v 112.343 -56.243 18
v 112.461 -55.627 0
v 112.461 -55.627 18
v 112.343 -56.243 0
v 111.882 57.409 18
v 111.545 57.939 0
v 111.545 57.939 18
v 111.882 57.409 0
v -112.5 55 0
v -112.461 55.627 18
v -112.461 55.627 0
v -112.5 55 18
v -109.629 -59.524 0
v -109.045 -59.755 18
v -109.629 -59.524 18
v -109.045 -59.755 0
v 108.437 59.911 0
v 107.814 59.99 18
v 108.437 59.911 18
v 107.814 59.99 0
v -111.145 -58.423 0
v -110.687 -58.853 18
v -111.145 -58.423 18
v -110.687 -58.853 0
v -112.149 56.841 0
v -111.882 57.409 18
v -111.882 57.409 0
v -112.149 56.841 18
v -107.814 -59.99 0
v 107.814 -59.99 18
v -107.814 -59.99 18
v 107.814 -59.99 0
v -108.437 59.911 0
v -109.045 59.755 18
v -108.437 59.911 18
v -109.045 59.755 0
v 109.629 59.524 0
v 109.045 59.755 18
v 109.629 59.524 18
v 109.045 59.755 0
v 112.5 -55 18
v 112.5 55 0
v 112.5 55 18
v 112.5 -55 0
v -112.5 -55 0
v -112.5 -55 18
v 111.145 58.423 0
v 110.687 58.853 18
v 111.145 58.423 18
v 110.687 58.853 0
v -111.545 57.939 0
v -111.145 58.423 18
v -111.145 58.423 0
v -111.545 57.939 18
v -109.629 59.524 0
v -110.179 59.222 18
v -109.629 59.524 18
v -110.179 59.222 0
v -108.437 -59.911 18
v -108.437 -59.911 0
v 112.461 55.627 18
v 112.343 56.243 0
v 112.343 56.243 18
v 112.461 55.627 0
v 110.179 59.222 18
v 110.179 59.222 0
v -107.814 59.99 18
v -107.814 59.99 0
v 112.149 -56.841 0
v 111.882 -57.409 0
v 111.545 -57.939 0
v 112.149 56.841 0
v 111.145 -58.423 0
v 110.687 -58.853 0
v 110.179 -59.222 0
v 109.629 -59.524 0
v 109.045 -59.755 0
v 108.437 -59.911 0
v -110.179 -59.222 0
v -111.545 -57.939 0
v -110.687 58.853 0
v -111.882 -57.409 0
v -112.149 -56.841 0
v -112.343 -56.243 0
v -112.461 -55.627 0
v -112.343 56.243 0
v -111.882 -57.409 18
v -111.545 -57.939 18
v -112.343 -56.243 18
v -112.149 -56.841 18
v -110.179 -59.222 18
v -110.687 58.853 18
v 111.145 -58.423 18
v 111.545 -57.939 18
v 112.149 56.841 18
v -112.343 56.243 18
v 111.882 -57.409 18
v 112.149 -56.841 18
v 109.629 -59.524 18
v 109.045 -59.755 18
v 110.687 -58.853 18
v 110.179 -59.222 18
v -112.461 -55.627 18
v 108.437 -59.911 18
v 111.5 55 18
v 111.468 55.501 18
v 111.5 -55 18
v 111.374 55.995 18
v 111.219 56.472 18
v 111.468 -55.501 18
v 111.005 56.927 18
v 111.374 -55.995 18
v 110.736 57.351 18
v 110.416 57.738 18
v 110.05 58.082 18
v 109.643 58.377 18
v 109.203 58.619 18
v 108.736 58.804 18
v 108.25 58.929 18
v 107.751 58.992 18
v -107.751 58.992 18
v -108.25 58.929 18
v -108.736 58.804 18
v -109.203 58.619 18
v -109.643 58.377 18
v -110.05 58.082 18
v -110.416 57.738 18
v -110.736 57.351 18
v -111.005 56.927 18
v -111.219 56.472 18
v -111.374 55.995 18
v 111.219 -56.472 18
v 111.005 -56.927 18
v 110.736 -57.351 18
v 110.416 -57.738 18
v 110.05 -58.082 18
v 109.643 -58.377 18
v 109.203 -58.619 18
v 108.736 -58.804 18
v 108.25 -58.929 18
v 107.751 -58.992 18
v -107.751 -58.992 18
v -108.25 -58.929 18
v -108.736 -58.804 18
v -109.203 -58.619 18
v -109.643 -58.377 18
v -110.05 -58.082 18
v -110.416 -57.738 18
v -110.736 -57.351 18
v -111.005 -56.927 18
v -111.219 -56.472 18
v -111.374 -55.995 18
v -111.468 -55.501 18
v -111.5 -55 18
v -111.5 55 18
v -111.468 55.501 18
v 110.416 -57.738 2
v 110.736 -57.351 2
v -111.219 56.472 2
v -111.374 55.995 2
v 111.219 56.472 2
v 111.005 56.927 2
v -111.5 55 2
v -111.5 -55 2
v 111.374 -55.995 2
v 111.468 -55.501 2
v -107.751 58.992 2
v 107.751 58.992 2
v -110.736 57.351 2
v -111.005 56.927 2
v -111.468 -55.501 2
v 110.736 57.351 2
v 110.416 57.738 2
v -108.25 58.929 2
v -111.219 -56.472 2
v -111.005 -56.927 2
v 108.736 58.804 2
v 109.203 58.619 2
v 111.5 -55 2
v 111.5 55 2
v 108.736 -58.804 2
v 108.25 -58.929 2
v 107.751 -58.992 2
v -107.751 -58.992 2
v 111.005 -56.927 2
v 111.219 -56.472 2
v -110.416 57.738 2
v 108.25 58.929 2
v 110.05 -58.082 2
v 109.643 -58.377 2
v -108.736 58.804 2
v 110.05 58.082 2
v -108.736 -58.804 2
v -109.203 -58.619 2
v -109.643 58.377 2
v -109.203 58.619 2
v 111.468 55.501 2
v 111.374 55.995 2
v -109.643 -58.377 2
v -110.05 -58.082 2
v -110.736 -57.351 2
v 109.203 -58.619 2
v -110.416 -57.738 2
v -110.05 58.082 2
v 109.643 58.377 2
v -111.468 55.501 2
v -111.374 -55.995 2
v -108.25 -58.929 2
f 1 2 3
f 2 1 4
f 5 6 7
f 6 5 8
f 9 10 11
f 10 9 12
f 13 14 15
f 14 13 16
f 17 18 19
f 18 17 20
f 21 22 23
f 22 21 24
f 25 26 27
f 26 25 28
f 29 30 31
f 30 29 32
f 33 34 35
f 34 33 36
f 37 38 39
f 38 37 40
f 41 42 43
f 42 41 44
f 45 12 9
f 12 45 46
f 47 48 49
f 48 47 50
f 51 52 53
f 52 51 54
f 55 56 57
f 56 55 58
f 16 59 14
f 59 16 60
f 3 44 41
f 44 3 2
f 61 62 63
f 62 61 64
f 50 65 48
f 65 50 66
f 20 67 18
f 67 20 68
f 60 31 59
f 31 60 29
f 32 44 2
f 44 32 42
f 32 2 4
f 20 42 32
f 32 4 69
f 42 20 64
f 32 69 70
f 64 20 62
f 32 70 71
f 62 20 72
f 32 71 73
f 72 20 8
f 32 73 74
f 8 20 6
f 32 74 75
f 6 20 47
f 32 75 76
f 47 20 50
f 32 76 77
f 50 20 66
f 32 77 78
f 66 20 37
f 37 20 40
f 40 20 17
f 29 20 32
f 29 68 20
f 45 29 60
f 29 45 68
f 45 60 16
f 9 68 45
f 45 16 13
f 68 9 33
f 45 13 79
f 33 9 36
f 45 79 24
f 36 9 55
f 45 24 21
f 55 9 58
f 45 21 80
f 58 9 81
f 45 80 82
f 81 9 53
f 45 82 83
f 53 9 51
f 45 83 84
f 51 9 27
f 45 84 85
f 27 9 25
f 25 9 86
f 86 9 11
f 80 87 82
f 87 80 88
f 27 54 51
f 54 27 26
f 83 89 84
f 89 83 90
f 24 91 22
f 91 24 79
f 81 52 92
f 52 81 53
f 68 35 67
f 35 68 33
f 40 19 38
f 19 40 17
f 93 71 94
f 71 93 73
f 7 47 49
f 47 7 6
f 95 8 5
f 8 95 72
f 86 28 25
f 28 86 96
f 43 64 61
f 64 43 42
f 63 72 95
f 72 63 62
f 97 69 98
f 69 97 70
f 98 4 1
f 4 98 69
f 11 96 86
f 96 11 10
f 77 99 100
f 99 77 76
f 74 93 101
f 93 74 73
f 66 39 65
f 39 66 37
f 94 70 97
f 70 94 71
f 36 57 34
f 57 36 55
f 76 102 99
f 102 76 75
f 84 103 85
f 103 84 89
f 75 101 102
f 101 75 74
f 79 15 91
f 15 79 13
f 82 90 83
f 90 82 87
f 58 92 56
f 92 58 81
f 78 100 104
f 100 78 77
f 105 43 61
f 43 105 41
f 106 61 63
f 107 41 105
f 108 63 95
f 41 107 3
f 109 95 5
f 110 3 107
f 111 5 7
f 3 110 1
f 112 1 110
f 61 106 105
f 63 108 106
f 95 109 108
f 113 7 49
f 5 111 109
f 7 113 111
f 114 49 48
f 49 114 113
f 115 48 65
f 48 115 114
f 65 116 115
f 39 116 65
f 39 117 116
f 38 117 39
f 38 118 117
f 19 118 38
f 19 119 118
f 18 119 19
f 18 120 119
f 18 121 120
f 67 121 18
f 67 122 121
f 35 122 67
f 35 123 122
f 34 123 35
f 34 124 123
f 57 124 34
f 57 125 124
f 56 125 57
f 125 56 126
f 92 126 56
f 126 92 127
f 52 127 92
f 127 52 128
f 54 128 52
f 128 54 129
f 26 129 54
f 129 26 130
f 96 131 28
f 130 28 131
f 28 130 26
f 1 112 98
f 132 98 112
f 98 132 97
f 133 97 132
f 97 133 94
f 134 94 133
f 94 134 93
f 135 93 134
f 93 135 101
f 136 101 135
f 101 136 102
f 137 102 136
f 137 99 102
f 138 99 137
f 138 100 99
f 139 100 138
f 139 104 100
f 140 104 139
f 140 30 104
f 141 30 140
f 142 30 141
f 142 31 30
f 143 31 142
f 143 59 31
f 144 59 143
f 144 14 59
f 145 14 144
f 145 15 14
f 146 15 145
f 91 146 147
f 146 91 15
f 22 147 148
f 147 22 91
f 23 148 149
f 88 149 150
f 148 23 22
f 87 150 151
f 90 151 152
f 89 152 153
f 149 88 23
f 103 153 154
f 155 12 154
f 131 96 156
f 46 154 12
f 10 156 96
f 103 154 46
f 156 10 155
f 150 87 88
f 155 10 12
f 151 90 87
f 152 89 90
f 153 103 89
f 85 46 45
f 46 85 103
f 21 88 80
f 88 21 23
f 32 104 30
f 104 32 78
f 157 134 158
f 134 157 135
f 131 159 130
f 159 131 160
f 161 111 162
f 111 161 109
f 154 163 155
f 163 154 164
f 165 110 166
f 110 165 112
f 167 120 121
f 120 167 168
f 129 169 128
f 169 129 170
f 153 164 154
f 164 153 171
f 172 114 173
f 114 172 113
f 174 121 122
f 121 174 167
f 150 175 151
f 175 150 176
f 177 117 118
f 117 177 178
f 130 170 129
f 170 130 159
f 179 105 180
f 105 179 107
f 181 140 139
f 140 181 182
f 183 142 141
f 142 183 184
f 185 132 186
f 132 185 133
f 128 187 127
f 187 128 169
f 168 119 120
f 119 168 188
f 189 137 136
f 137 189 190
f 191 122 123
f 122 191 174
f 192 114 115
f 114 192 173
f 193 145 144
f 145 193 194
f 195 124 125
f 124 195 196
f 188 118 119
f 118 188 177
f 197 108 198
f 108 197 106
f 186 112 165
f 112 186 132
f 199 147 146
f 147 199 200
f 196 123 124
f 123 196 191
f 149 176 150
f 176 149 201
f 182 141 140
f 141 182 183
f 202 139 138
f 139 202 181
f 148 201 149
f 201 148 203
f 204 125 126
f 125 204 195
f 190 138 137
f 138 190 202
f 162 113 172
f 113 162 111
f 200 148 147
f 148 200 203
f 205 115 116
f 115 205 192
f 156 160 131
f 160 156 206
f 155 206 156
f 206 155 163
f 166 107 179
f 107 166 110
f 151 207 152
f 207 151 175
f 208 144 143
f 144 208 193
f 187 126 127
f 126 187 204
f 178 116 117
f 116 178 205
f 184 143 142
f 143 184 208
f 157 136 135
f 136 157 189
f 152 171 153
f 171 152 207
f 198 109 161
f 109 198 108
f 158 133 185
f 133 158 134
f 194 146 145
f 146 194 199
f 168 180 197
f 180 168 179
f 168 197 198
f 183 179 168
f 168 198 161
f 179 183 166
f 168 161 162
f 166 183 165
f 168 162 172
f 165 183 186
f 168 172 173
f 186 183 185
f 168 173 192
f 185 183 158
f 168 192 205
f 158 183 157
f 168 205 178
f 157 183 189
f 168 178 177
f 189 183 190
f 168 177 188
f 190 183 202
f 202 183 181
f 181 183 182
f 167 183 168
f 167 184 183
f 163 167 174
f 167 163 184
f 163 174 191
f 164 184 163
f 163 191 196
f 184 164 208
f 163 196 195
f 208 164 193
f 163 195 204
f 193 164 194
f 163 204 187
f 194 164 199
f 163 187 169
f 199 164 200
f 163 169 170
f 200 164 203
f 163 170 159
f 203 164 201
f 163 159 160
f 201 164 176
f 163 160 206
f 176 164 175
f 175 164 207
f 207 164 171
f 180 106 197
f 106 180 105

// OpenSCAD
$fn = 50;


difference() {
	union() {
		hull() {
			translate(v = [-107.5000000000, 55.0000000000, 0]) {
				cylinder(h = 18, r = 5);
			}
			translate(v = [107.5000000000, 55.0000000000, 0]) {
				cylinder(h = 18, r = 5);
			}
			translate(v = [-107.5000000000, -55.0000000000, 0]) {
				cylinder(h = 18, r = 5);
			}
			translate(v = [107.5000000000, -55.0000000000, 0]) {
				cylinder(h = 18, r = 5);
			}
		}
	}
	union() {
		translate(v = [0, 0, 2]) {
			hull() {
				translate(v = [-107.5000000000, 55.0000000000, 0]) {
					cylinder(h = 16, r = 4);
				}
				translate(v = [107.5000000000, 55.0000000000, 0]) {
					cylinder(h = 16, r = 4);
				}
				translate(v = [-107.5000000000, -55.0000000000, 0]) {
					cylinder(h = 16, r = 4);
				}
				translate(v = [107.5000000000, -55.0000000000, 0]) {
					cylinder(h = 16, r = 4);
				}
			}
		}
	}
}
